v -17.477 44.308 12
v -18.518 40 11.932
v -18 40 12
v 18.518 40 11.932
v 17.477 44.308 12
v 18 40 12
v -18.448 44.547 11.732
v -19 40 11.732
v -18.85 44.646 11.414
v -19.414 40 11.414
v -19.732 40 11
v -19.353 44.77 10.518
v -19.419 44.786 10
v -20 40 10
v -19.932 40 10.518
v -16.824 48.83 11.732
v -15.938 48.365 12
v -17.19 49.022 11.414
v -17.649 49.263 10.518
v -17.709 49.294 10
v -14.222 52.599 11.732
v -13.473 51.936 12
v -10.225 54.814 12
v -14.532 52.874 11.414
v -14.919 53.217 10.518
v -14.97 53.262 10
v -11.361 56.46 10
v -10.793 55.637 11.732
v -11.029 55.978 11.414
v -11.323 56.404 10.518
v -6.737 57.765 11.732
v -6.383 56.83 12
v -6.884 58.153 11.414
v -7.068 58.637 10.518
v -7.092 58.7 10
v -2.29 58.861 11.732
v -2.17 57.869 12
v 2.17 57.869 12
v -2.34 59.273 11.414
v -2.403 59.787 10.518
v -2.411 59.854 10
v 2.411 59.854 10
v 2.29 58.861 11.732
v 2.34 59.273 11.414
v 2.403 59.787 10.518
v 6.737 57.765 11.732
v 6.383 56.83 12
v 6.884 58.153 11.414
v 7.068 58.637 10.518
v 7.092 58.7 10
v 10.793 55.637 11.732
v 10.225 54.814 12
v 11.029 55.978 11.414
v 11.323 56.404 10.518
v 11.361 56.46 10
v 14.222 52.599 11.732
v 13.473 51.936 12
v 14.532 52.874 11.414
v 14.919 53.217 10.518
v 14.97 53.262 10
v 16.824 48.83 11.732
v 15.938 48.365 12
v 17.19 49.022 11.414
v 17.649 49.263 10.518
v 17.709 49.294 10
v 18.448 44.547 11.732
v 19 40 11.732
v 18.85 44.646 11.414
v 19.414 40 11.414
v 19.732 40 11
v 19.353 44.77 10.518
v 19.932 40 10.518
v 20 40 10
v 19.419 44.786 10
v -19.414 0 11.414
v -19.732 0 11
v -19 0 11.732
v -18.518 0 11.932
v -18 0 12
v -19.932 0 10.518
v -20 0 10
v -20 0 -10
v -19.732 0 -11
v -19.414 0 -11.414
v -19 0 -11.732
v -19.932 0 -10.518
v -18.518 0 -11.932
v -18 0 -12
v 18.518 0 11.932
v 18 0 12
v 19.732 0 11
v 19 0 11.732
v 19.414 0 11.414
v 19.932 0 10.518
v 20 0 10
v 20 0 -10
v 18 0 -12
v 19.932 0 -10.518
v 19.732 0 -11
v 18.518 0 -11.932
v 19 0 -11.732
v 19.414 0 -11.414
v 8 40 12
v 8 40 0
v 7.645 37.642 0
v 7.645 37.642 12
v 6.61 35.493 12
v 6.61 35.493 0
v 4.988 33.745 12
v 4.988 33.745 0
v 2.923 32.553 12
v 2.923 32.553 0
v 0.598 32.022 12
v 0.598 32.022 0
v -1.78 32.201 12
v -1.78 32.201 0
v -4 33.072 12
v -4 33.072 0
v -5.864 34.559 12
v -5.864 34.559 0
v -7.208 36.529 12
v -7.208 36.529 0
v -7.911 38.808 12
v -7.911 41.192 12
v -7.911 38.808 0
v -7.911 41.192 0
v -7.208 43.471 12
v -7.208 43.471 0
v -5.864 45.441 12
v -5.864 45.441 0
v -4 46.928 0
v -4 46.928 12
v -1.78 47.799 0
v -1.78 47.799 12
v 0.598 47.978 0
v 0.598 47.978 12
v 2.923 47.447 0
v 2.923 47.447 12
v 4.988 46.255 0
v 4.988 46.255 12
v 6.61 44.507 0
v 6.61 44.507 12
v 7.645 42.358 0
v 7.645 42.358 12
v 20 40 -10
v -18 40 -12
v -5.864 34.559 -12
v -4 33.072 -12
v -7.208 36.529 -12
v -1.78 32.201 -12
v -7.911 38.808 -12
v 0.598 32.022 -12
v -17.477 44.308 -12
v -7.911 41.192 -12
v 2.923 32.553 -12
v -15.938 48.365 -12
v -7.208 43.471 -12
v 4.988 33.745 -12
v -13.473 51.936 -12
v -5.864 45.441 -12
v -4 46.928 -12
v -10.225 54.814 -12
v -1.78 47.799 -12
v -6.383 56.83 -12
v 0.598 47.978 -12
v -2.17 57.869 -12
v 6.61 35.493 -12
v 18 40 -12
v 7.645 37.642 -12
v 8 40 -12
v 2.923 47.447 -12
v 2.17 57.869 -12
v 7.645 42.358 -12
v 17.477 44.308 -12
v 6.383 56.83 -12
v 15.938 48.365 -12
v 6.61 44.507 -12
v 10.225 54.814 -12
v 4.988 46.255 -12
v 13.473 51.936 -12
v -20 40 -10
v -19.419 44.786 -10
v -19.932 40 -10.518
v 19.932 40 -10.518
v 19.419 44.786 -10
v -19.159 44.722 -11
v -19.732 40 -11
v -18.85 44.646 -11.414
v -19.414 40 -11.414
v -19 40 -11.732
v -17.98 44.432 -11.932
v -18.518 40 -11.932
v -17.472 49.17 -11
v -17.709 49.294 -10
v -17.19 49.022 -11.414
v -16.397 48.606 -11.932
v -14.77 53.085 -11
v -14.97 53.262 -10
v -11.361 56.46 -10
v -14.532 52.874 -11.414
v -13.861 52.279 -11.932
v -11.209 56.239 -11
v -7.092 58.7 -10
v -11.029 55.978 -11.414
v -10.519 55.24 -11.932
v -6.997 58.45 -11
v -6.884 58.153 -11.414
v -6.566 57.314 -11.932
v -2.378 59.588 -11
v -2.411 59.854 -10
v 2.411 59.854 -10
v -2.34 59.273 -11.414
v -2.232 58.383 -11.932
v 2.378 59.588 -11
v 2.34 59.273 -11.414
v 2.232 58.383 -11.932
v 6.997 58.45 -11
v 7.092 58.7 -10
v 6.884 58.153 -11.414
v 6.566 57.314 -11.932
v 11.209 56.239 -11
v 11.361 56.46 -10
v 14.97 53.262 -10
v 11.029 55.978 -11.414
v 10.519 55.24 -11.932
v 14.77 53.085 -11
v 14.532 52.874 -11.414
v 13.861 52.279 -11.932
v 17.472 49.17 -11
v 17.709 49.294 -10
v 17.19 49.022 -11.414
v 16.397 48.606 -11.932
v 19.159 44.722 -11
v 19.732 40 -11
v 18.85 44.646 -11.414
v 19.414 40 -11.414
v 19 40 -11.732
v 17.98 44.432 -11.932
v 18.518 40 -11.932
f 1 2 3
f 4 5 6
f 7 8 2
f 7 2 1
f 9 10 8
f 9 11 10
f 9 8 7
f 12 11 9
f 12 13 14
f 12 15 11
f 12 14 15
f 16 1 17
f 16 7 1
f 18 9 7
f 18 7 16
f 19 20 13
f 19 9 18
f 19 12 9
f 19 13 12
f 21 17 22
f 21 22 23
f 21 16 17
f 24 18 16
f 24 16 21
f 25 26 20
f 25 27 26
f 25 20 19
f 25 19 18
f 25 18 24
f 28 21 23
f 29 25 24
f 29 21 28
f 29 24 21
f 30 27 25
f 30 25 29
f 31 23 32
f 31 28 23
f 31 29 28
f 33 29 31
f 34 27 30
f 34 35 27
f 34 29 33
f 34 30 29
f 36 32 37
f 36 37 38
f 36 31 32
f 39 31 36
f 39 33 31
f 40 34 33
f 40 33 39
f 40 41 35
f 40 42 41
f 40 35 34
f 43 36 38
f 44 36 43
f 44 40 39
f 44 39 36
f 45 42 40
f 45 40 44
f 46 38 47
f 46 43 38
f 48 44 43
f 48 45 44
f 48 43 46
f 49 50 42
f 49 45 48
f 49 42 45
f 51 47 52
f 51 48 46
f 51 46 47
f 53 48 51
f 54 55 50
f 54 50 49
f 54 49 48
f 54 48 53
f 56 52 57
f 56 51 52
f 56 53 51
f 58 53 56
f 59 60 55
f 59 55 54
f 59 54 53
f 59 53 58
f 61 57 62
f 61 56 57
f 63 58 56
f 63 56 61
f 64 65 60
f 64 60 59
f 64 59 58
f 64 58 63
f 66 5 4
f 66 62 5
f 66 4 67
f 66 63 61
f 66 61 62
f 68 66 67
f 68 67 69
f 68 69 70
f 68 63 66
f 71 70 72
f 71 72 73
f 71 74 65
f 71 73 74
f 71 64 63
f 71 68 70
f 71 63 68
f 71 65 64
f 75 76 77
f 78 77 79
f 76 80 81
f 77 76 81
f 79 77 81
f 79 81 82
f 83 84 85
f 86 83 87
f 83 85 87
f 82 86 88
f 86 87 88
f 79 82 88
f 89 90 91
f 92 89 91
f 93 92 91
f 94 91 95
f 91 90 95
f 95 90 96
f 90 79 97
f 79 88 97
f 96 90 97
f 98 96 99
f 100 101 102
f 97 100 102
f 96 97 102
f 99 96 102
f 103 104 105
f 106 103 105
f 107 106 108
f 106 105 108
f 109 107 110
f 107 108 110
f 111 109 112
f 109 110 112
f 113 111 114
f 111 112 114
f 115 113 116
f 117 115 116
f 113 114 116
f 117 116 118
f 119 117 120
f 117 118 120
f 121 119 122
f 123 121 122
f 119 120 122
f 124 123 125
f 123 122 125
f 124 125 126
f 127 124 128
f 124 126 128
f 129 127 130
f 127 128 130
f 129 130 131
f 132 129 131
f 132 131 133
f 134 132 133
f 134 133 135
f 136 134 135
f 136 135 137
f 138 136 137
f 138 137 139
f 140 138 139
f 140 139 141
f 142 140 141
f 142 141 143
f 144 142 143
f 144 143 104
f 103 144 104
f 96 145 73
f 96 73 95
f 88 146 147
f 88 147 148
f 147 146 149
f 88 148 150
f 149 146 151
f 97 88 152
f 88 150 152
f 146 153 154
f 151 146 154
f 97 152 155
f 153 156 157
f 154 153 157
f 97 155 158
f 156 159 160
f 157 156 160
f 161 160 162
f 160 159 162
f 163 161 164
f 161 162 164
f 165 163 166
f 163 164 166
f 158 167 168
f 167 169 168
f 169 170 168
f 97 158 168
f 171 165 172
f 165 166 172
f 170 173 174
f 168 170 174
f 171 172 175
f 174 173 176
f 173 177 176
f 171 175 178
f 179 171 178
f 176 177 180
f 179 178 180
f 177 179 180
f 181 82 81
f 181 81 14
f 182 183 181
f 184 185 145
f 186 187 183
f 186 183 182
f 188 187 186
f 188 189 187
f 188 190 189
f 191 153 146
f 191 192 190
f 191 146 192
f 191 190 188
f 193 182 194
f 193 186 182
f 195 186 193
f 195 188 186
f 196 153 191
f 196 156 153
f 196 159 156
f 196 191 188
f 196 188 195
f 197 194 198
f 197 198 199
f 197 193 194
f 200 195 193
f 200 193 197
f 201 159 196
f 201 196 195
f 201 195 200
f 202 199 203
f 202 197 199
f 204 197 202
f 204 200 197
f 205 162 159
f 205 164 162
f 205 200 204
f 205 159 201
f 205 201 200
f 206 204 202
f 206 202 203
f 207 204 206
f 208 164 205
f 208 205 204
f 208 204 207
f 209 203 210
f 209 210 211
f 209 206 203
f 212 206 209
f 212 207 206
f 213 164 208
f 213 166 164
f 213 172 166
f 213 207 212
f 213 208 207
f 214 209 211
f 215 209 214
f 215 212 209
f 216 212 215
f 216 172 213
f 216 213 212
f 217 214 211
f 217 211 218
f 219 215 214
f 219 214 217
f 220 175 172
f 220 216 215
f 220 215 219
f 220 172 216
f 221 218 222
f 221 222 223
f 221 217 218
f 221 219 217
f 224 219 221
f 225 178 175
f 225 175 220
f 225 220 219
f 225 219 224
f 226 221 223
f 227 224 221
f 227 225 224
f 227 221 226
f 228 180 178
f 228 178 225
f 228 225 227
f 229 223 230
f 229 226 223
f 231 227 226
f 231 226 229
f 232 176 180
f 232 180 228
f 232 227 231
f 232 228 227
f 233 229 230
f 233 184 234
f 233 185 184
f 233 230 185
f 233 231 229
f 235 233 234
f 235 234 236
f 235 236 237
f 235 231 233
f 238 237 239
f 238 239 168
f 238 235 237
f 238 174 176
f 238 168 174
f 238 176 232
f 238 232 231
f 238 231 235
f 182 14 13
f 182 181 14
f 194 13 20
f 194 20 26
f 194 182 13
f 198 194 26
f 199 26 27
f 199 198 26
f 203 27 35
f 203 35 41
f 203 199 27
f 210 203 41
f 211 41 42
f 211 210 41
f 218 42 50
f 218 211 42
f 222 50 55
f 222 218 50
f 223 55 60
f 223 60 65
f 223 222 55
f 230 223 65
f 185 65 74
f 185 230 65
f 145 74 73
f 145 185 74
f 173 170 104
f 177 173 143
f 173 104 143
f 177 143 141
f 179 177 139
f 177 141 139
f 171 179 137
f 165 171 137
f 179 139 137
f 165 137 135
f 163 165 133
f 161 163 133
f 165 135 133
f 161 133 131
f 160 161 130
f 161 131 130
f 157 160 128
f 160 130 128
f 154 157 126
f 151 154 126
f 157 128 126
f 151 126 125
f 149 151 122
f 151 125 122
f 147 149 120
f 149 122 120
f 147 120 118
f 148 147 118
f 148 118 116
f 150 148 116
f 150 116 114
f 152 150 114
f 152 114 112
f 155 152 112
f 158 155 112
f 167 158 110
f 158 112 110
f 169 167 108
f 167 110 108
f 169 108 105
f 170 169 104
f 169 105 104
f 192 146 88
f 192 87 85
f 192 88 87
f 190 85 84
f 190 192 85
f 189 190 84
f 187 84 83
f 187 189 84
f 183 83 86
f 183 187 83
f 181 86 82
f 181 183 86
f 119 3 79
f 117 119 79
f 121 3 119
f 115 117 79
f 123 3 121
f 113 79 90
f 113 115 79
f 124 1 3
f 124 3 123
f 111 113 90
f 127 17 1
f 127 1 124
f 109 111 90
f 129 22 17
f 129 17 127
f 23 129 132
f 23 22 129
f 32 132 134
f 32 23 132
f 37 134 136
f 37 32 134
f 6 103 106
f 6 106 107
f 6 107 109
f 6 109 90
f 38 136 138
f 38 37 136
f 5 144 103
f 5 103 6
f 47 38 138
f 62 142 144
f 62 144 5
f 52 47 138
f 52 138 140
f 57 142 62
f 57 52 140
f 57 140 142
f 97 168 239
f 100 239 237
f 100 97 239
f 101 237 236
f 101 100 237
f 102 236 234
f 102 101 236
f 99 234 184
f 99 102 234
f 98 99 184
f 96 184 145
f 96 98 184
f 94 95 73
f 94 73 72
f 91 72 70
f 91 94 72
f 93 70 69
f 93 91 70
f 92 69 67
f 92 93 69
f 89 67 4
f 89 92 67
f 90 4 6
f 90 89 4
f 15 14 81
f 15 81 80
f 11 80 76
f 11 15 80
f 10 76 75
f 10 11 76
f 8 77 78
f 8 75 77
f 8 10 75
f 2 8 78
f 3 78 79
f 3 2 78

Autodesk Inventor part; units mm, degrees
ref_plane "YZ Plane" through (0, 0, 0) normal (1, 0, 0) x (0, 1, 0)
ref_plane "XZ Plane" through (0, 0, 0) normal (0, 1, 0) x (-1, 0, 0)
ref_plane "XY Plane" through (0, 0, 0) normal (0, 0, 1) x (1, 0, 0)
sketch "Sketch1" plane through (0, 0, 0) normal (0, 0, 1) x (1, 0, 0)
  line L0 (-28, 0) -> (28, 0) projected
  line L1 (0, -12) -> (0, 72) projected
  line L2 (-20, 60) -> (20, 60)
  line L3 (20, 60) -> (20, 0)
  line L4 (20, 0) -> (-20, 0)
  line L5 (-20, 0) -> (-20, 60)
  arc A0 (20, 40) -> (-20, 40) centre (0, 40) ccw
  line L6 (-20, 40) -> (20, 40) construction
  circle A1 centre (0, 40) radius 8
  point P0 (0, 0)
  point P1 (0, 60)
  point P2 (0, 0)
  dimension "d0" = 40
  dimension "d1" = 60
  dimension "d2" = 8
extrude "Extrusion1" add sketch "Sketch1" along normal mid plane 24 contours L5 A0 L1 A1 L0 | L1 A1 A0 L3 L0
fillet "Fillet1" radius 2 8 edges at (20, 20, 12) (-14.1421, 54.1421, 12) (14.1421, 54.1421, 12) (-20, 20, 12) (20, 20, -12) (-14.1421, 54.1421, -12) (14.1421, 54.1421, -12) (-20, 20, -12)
properties part number "Lagar"
